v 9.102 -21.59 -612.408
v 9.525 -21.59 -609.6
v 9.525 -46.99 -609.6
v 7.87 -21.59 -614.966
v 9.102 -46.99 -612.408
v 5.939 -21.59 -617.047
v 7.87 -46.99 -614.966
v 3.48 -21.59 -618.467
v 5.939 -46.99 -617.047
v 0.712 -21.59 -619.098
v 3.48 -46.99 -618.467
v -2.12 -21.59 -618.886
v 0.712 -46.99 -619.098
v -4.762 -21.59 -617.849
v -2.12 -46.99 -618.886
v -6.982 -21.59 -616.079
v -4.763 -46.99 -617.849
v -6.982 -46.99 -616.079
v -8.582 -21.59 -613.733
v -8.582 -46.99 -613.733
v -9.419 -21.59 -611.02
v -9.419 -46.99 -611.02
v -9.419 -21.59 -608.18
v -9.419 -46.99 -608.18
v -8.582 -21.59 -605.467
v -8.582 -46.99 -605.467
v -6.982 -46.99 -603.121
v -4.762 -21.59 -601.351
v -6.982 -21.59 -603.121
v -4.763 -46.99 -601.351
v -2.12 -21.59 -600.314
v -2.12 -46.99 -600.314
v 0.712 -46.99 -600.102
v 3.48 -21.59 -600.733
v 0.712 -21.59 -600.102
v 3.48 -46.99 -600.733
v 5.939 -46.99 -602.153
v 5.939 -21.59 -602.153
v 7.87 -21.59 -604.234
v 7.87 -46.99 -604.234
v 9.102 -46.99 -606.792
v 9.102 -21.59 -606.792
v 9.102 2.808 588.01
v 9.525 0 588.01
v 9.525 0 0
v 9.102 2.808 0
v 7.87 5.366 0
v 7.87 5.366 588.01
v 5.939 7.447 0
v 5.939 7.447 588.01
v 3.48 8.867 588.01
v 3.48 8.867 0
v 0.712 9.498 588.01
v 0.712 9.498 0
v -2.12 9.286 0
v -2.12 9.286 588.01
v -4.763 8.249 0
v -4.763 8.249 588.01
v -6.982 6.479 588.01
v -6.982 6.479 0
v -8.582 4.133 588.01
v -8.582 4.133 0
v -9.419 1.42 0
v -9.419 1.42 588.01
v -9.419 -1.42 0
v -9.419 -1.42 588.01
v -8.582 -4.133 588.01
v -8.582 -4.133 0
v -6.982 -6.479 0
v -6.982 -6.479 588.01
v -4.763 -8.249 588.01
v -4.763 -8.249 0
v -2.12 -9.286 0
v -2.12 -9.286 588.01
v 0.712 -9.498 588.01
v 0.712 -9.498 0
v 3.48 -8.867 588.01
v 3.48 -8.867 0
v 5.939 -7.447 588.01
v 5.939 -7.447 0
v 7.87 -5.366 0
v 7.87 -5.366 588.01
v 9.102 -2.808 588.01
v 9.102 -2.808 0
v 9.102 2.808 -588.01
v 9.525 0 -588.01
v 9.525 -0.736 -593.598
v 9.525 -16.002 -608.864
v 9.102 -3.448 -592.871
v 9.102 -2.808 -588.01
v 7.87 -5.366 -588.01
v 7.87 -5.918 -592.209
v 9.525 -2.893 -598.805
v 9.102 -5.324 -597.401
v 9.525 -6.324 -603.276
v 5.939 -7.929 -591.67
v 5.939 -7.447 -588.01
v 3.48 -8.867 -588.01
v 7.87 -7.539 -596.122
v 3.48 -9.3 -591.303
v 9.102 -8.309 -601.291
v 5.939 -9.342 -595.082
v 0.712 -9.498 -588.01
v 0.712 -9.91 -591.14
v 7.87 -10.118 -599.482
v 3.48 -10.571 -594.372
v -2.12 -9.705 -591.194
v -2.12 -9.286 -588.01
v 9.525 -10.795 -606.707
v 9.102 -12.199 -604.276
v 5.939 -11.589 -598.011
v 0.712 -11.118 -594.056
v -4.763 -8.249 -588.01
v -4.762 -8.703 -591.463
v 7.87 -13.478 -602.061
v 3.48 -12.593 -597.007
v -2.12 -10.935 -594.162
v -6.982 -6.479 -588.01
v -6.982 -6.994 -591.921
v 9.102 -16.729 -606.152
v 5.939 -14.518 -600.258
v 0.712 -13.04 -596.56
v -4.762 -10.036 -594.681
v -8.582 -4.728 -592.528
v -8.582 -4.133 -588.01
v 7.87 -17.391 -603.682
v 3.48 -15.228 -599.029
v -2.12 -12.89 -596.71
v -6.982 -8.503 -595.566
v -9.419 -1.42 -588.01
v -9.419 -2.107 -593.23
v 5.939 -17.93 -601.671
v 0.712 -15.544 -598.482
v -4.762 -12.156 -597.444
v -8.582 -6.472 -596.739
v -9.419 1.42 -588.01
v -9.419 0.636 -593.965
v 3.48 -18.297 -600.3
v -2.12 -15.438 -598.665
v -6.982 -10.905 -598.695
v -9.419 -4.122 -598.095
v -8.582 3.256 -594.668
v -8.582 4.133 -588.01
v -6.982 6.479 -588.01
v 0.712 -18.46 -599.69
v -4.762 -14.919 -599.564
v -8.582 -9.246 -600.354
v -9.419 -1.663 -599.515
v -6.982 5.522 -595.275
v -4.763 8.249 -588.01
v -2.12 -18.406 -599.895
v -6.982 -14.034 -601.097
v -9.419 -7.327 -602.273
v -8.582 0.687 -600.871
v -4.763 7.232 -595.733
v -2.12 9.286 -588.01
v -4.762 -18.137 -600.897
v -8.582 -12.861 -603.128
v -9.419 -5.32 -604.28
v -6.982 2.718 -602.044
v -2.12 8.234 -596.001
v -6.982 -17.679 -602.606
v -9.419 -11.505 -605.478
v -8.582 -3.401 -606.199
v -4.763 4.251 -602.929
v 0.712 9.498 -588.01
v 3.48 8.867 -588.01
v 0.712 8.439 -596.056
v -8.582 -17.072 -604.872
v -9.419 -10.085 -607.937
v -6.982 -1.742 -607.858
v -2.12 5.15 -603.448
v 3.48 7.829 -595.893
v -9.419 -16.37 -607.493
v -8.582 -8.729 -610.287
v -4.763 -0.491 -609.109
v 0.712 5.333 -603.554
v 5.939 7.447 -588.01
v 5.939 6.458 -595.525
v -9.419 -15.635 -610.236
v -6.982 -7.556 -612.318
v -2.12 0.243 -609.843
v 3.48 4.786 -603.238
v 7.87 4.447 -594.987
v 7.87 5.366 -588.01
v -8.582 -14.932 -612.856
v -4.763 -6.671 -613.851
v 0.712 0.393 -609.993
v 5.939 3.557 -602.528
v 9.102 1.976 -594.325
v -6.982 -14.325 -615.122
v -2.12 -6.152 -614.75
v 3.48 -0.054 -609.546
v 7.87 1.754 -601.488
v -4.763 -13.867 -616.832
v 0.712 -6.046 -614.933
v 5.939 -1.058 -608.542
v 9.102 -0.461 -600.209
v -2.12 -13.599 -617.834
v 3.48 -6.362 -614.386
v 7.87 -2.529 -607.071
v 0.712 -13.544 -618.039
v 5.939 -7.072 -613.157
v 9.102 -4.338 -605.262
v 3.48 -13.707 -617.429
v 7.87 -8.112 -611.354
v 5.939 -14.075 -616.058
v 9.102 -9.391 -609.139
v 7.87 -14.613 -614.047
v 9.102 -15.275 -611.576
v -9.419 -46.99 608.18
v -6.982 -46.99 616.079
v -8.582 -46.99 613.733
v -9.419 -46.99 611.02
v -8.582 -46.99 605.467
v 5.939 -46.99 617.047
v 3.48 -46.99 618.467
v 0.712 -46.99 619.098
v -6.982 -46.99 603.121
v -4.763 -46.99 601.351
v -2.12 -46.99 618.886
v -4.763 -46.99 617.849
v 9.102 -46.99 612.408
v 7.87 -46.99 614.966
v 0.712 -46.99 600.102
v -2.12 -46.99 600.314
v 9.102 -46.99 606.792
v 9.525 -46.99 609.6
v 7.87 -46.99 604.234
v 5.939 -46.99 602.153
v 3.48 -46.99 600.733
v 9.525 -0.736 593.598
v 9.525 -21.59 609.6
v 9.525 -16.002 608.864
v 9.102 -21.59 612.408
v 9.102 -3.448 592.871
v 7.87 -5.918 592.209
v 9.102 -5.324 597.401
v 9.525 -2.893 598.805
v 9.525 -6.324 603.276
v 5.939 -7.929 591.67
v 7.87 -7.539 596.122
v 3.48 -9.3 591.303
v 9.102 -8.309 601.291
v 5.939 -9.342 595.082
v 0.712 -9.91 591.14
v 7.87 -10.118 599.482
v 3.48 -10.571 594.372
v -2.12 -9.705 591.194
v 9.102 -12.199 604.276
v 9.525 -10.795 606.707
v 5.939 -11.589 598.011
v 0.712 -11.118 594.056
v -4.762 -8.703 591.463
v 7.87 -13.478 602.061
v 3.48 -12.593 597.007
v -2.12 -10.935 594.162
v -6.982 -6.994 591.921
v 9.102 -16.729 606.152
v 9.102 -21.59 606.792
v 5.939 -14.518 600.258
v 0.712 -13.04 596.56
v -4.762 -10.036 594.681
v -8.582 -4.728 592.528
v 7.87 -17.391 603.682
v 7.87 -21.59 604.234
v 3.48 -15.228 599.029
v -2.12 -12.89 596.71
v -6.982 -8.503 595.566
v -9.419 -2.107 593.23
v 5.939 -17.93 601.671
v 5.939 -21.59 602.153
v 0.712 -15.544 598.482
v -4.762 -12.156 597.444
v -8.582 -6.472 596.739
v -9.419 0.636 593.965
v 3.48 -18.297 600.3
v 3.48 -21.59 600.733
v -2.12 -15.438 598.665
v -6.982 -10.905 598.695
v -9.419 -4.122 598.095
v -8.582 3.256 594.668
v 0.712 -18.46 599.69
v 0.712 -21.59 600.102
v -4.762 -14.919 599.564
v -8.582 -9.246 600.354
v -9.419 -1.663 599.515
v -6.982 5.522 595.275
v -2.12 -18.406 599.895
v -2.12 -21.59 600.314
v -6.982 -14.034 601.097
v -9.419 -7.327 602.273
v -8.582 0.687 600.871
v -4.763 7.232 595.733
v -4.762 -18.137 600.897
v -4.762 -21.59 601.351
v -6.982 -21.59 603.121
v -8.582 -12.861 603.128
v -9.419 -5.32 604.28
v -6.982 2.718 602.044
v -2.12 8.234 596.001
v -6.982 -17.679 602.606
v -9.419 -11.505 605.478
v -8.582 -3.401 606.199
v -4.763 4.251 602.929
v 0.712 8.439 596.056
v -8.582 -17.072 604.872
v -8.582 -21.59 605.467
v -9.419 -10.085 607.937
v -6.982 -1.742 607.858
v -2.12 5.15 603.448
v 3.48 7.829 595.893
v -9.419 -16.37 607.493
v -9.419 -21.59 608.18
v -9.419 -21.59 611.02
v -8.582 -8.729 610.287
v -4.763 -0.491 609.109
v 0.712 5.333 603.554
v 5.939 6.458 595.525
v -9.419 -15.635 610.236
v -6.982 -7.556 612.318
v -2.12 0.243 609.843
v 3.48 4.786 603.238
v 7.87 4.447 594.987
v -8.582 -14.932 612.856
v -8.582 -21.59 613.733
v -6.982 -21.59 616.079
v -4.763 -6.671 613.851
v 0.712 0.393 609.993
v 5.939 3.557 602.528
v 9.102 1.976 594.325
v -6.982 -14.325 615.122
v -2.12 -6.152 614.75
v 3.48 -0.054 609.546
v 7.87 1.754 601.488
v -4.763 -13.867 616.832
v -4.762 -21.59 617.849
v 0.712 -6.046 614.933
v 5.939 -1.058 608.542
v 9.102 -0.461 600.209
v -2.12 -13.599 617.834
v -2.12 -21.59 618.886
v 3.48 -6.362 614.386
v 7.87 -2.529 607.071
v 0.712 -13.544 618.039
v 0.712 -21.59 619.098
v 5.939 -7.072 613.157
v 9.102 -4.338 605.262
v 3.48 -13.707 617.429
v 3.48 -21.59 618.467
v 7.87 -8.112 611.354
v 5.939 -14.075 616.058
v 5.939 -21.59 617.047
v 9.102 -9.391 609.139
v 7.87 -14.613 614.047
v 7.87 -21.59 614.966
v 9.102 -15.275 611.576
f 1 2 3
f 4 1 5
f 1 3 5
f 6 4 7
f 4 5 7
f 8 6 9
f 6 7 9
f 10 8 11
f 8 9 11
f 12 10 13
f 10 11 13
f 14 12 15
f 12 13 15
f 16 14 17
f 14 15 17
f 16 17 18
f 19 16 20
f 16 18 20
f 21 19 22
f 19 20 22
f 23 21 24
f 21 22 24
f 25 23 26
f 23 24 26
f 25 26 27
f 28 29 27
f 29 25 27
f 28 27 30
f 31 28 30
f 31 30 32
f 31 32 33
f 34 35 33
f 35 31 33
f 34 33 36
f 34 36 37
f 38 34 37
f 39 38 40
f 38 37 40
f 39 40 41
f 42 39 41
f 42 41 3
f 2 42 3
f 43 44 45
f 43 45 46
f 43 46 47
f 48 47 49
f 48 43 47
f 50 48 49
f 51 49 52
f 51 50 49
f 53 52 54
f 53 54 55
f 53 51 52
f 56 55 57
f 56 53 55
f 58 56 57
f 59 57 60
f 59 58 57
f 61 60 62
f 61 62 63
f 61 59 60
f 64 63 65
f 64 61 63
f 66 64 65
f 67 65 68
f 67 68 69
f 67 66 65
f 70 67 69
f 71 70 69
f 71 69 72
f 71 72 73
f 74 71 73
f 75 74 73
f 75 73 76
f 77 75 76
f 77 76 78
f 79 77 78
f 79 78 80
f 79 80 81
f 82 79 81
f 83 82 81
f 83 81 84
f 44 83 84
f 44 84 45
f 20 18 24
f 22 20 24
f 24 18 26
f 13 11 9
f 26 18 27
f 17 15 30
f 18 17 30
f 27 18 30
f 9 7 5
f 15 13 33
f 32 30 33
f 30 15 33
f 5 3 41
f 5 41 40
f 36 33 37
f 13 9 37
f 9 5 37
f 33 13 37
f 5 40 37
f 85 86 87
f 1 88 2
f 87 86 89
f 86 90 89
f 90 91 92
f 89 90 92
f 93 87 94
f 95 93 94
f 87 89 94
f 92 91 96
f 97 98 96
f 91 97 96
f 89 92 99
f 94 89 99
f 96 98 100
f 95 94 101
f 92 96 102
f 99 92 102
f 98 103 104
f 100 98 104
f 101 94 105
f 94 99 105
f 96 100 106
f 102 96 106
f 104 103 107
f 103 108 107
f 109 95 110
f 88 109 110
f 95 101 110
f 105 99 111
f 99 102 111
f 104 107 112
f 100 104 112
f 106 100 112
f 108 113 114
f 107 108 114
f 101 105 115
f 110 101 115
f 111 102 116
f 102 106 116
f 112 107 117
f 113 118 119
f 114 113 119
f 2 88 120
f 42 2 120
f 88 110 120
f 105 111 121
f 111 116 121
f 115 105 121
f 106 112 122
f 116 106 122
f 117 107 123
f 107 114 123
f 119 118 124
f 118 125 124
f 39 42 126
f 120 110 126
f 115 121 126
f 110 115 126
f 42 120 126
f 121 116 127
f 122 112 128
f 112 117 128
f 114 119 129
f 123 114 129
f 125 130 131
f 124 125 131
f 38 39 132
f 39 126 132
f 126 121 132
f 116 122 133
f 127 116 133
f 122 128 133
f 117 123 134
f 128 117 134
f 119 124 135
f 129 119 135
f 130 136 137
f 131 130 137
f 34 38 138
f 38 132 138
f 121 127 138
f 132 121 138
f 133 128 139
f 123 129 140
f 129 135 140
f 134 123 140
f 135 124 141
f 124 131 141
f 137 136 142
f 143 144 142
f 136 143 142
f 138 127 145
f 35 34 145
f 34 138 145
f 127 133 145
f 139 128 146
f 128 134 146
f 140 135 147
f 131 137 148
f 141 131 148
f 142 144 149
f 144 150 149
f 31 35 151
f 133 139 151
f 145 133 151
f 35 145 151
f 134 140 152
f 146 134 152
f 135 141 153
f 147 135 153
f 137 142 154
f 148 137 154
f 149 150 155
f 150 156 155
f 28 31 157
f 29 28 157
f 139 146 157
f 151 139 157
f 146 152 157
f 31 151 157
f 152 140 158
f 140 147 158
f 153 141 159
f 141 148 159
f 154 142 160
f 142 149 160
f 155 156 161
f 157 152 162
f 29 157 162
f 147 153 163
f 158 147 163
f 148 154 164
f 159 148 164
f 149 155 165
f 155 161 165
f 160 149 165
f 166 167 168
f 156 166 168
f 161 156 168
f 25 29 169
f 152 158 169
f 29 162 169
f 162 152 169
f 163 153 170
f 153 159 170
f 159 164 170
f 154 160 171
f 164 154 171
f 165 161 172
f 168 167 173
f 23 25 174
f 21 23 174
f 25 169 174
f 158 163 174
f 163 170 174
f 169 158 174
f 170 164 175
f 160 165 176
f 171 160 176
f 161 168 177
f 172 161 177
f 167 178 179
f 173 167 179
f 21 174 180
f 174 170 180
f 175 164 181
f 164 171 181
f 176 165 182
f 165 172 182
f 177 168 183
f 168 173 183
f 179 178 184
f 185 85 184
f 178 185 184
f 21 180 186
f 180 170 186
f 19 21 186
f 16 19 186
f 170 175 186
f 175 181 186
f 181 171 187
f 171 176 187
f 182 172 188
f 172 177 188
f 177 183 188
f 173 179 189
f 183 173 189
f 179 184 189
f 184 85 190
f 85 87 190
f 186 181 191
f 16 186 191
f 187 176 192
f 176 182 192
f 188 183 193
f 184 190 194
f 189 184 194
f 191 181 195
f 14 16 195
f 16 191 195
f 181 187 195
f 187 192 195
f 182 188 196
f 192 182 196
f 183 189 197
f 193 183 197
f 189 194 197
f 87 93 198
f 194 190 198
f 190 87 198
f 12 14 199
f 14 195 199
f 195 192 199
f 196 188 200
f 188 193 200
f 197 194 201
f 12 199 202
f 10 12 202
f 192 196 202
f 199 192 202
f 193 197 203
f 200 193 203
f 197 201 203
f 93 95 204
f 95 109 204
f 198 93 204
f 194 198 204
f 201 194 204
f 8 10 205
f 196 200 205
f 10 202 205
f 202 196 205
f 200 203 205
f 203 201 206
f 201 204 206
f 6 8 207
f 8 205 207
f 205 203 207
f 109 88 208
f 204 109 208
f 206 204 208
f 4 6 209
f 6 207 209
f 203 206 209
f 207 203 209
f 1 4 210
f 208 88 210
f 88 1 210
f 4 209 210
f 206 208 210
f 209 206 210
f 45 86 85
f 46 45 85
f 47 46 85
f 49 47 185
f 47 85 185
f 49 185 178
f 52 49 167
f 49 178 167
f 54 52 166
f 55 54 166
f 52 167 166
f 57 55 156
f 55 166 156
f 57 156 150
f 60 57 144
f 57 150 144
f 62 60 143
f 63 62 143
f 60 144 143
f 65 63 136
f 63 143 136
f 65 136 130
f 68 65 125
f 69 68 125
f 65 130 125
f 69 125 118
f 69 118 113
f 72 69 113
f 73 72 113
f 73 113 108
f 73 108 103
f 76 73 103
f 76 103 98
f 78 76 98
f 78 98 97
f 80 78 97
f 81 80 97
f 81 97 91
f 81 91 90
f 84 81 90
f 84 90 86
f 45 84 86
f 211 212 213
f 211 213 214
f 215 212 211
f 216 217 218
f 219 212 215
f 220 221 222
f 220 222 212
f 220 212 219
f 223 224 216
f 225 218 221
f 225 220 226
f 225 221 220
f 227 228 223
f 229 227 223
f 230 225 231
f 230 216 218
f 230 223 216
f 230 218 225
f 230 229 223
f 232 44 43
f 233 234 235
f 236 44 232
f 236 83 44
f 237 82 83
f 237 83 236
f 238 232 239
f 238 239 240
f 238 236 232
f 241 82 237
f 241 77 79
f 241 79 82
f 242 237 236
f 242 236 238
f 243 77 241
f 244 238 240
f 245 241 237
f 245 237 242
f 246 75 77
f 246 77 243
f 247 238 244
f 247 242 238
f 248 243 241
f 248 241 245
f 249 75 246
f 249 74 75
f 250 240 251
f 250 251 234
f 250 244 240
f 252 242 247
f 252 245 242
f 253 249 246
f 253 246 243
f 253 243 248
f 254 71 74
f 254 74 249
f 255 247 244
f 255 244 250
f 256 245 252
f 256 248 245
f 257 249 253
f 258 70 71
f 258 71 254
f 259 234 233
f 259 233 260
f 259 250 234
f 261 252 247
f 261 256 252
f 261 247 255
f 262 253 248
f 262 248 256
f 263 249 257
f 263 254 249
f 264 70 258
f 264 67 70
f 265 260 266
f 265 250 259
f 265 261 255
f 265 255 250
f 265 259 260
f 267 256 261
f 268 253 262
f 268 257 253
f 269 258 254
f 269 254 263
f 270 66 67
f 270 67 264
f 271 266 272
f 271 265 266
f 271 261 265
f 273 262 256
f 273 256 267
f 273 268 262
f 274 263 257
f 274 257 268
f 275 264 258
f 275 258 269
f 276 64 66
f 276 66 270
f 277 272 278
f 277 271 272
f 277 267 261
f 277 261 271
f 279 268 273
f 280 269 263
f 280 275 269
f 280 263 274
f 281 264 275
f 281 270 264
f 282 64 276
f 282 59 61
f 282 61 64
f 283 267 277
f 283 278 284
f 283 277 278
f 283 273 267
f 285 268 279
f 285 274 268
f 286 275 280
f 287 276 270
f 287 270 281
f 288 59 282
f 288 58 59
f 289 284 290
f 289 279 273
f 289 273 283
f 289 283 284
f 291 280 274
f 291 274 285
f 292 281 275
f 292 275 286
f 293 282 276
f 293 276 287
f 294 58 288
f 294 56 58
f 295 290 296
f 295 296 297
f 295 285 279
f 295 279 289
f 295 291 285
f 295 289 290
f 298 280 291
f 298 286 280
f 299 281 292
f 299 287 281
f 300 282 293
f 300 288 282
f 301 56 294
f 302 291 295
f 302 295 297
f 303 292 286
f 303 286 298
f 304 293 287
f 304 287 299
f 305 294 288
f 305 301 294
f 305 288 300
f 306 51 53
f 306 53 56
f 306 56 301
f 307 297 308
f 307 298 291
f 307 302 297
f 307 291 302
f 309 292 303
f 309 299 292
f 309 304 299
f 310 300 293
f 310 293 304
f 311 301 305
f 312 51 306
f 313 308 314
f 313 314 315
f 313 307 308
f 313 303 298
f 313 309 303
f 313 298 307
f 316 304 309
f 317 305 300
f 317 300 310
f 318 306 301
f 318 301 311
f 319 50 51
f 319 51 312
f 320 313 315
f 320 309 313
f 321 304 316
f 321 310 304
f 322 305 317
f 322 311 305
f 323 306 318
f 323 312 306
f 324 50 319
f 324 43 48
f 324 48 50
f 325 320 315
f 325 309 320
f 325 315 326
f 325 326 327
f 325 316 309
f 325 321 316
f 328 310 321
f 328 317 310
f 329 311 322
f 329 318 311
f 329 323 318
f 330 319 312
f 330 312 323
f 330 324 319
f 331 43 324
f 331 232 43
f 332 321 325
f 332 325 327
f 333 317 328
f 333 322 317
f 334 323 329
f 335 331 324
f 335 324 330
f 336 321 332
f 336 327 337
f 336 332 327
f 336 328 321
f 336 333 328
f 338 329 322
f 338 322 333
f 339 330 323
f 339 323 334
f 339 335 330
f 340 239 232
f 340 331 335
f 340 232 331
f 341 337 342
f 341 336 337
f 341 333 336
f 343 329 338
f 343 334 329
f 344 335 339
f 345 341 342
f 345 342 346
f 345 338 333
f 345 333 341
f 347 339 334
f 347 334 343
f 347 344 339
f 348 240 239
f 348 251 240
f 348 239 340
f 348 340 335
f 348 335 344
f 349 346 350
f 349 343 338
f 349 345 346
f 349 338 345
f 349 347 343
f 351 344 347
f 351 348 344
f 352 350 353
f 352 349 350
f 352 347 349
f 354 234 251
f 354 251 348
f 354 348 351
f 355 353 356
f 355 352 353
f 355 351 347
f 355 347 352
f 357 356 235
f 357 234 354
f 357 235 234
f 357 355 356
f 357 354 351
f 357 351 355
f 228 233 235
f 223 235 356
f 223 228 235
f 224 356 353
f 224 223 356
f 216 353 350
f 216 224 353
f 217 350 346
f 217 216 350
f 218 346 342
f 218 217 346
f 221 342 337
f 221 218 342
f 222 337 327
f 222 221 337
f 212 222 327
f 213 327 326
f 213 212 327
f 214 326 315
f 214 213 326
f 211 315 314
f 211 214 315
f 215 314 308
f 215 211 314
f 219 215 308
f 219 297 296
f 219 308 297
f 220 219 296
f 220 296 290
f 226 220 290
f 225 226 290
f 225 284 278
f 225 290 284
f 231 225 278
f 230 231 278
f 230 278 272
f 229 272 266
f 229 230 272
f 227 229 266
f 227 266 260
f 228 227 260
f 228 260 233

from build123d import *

# Parameters (mm, degrees)
F2_R = 9.525


with BuildPart() as f3:
    # F3: sweep along a path in F0
    with BuildLine(Plane.YZ) as f3_path:
        Line((0, 0), (0, 588.01))
        ThreePointArc((0, 588.01), (-6.3235645942, 603.2764354058), (-21.59, 609.6))
        Line((-21.59, 609.6), (-46.99, 609.6))
    # F2 (on offset) → F3 (sweep)
    with BuildSketch(Plane.XZ.offset(46.99)):
        with Locations((0, 609.6)):
            Circle(F2_R)
    sweep(path=f3_path.line)

    # F4: F3 across plane


with BuildPart() as f3_1:
    add(f3.part)
    add(f3.part.mirror(Plane.XY))


solid = f3_1.part
